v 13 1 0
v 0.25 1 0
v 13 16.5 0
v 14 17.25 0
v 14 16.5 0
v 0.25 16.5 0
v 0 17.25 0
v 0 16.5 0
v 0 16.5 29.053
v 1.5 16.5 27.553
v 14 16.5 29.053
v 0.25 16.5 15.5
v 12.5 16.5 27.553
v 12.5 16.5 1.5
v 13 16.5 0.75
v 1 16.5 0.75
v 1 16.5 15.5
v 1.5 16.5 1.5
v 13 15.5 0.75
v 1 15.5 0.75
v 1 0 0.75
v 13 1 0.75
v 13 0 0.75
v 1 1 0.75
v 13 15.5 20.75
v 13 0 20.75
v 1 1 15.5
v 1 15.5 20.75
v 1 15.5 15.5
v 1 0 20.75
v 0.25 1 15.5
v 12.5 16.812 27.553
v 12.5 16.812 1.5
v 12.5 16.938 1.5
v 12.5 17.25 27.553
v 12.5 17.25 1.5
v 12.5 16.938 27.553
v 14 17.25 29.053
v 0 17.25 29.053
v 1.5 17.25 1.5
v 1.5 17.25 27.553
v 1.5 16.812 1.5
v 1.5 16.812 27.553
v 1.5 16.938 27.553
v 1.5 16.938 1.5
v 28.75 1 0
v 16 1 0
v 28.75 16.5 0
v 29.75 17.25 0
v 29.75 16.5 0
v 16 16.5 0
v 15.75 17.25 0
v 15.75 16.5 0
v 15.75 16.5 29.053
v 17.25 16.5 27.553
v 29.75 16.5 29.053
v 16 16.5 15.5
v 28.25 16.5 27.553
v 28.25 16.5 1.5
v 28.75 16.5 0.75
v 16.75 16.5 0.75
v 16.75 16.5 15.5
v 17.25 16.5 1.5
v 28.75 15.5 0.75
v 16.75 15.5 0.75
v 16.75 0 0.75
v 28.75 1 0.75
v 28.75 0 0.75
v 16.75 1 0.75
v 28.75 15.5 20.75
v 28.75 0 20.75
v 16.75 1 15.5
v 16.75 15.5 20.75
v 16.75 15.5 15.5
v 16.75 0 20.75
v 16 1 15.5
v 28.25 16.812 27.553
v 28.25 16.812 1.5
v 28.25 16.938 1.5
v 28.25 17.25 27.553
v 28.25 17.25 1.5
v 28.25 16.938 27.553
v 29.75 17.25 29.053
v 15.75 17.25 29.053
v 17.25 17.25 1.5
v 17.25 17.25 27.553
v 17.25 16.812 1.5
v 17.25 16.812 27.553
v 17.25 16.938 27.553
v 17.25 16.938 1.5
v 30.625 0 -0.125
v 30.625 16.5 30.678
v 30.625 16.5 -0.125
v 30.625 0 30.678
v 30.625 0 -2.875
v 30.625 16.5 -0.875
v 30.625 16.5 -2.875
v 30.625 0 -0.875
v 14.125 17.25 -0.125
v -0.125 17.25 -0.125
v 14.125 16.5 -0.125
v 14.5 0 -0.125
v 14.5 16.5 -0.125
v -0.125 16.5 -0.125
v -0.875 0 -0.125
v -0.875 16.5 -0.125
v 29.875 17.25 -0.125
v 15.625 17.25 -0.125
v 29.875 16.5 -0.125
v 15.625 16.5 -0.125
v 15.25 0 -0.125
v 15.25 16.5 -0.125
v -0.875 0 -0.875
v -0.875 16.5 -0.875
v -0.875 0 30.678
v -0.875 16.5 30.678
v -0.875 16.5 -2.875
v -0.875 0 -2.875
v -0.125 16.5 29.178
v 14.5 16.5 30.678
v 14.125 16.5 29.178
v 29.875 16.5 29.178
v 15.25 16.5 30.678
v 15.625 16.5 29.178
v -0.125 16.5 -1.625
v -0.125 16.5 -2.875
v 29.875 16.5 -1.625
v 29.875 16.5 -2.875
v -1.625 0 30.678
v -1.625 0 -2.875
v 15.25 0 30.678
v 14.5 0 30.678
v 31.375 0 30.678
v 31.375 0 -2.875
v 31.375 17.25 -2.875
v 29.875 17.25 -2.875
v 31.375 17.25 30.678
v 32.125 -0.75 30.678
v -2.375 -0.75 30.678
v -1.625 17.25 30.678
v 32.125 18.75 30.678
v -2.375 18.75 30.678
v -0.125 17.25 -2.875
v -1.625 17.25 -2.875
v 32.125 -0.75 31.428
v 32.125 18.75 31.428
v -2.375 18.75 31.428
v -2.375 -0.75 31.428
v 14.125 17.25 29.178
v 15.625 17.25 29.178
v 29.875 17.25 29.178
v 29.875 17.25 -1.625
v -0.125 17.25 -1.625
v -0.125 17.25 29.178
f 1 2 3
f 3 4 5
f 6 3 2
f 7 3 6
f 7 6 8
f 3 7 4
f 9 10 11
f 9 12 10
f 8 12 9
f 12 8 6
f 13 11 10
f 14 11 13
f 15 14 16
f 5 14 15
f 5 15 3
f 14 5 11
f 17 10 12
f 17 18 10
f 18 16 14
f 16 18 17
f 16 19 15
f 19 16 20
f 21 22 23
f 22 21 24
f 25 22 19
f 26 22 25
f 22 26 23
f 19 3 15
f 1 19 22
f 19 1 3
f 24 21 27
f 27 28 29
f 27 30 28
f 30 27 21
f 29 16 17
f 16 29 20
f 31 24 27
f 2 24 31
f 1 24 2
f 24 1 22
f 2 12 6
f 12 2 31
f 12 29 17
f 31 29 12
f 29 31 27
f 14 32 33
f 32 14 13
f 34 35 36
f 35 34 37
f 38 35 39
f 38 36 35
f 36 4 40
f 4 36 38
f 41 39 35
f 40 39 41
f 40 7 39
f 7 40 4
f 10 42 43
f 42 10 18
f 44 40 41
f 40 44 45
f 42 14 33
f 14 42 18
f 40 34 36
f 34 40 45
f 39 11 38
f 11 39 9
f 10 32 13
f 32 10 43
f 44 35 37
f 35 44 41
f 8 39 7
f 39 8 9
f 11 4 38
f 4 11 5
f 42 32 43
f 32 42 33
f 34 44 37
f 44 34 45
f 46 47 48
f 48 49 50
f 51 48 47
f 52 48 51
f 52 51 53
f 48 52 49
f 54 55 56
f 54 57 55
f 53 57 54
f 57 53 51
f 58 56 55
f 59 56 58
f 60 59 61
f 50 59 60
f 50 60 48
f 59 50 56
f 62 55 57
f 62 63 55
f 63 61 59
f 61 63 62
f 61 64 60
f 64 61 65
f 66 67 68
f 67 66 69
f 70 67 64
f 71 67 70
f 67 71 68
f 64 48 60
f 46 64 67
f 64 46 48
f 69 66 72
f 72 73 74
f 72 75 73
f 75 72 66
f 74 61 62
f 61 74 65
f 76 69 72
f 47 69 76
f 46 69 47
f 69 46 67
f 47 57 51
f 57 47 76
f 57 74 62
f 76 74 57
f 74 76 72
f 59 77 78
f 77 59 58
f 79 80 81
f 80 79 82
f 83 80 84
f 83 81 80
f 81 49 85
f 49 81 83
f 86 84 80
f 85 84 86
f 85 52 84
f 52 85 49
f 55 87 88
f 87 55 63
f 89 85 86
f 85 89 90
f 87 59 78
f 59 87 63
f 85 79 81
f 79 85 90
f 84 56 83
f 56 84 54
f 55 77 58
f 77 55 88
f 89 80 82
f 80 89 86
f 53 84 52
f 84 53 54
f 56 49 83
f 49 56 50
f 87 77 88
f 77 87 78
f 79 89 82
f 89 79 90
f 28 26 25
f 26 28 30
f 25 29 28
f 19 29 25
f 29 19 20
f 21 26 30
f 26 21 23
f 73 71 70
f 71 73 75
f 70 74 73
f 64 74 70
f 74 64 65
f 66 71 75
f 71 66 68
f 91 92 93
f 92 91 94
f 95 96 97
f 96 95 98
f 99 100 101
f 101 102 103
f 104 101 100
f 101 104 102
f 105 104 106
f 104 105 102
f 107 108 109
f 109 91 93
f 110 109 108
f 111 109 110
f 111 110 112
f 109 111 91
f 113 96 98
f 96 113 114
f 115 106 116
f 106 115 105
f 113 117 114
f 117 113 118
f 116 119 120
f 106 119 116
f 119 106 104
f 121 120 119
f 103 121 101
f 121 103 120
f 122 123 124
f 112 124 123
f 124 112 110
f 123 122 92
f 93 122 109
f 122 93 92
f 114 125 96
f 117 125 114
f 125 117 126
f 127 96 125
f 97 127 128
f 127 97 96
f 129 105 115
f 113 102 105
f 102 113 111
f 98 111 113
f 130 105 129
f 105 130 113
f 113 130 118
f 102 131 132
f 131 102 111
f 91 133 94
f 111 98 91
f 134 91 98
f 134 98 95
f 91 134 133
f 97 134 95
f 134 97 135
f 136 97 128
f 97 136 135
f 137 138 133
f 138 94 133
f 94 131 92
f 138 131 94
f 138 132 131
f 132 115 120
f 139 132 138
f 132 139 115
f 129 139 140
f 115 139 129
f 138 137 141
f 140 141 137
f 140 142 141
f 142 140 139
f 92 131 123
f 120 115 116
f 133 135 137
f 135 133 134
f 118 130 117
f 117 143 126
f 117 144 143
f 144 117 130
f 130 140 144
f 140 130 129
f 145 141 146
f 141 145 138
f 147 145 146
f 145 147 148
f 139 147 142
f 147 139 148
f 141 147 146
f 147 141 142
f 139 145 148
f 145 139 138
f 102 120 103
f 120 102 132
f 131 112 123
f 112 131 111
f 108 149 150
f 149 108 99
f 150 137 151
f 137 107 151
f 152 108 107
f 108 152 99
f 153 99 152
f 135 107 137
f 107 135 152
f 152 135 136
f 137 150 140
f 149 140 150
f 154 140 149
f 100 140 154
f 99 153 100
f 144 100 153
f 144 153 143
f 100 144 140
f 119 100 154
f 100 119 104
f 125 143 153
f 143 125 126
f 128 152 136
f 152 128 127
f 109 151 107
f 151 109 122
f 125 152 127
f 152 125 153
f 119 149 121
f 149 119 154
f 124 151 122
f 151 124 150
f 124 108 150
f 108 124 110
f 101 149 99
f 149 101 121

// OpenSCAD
module board( size, label = false ) {
    // size[0] is always with the grain.
    // size[1] is against the grain.
    // size[2] is the board thickness.
    
    cube( size = size );
    
    // Output the size of the board for easy cut lists.
    echo( str( size[2], " ", label, ": ", size[0], "x", size[1]));
}

width_of_can = 12;
height_of_can = 20;
depth_of_can = 15.5;
number_of_cans = 2;
bead_board_inset = 1/2;
bead_board_thickness = 1/8;
lid_overhang_front = 1.5;  // Overhang for the lid front
lid_overhang_sides = .75; // Overhang for the lid sides
lid_overhang_back = .75; // Overhang for the back of the lid.

toe_clearance = 2; // Space between the bottom board and the floor.
stock_thickness = 3/4;
cabinet_door_clearance = 1/8;

horizontal_can_clearance = 1;
vertical_can_clearance = 3;
depth_can_clearance = 1; // Space behind cans.

each_can_cabinet_door_width = width_of_can + horizontal_can_clearance + horizontal_can_clearance;

each_can_cabinet_door_height =
    stock_thickness // The base of the tilting door.
    + sqrt( ( height_of_can * height_of_can ) + ( depth_of_can * depth_of_can ) ) // The longest diagonal across the can.
    + vertical_can_clearance // Extra space for clearance and garbage at the top.
    ;

face_frame_width = 1.5;
depth_of_box = depth_of_can + depth_can_clearance;

width_of_horizontal_base =
    (number_of_cans * ( each_can_cabinet_door_width + cabinet_door_clearance + cabinet_door_clearance ) ) // Space for doors and clearance.
    + ((number_of_cans + 1 ) * face_frame_width) // Space for the surrounding face frames
    - stock_thickness - stock_thickness // Minus the width of the end boards.
    ;

translate([0, depth_of_box+stock_thickness, 0]) rotate([-40 * $t, 0, 0]) translate([0, -depth_of_box-stock_thickness, 0]) union() {
    color( "white" ) {
    translate([0, depth_of_box + stock_thickness, 0])
    for (can_number=[0:number_of_cans-1]){
        // Cabinet doors.
        translate([
            ( can_number * ( each_can_cabinet_door_width + cabinet_door_clearance + face_frame_width + cabinet_door_clearance ) ),
            0,
            0
         ])
            rotate([90, 0, 0])
            union() {
                    // Base that holds the can.
        translate([width_of_can + ((each_can_cabinet_door_width - width_of_can) / 2), stock_thickness, stock_thickness]) 
            rotate([0, -90, 90])
            board( [ depth_of_can, width_of_can, stock_thickness], "can base" );
           
                // Base sides
                translate([((each_can_cabinet_door_width - width_of_can) / 2), 0, stock_thickness]) rotate([0, -90, 0]) board( [ depth_of_can, depth_of_box - depth_can_clearance, stock_thickness ], "can sides (combined)" );
            
                // Bottom board.
                translate([face_frame_width, 0, 0])
                    board([ each_can_cabinet_door_width - (face_frame_width * 2), face_frame_width, stock_thickness], "door face frame" );
            
                // Top Board.
                translate([face_frame_width, each_can_cabinet_door_height - face_frame_width, 0])
                    board([ each_can_cabinet_door_width - (face_frame_width * 2), face_frame_width, stock_thickness], "door face frame" );
            
                // Left board.
                translate([face_frame_width, 0, 0] )
                    rotate( [0, 0, 90 ] )
                    board( [ each_can_cabinet_door_height, face_frame_width, stock_thickness ], "door face frame" );
            
                // Right board.
                translate([each_can_cabinet_door_width, 0, 0] )
                    rotate( [0, 0, 90 ] )
                    board( [ each_can_cabinet_door_height, face_frame_width, stock_thickness ], "door face frame" );
            
                // Inset.
                color( "white" ) translate([each_can_cabinet_door_width - face_frame_width + bead_board_inset, face_frame_width - bead_board_inset, ( (stock_thickness - bead_board_thickness ) / 2) ])
                    rotate([0, 0, 90])
                    board([ each_can_cabinet_door_height + ( bead_board_inset * 2 ) - face_frame_width - face_frame_width, each_can_cabinet_door_width + ( bead_board_inset * 2 ) - face_frame_width - face_frame_width, bead_board_thickness], "beadboard" );
    }
}}
    // Mock up the cans.
    color( "orange") for (can_number=[0:number_of_cans-1]) {
        translate([
            ((each_can_cabinet_door_width - width_of_can) / 2)
    
        + (can_number * (each_can_cabinet_door_width + cabinet_door_clearance + cabinet_door_clearance + face_frame_width ) )
    
        ,
            0, stock_thickness
        ])
            cube([width_of_can, depth_of_can, height_of_can]);
    }

}{

// Bottom support board.
color( "white" ) translate([
    -cabinet_door_clearance + stock_thickness - face_frame_width,
    0,
    -stock_thickness - cabinet_door_clearance
    ])
    board( [ width_of_horizontal_base, depth_of_box, stock_thickness ], "box frame (bottom)" );

// Near side.
color( "white" ) translate( [ stock_thickness - cabinet_door_clearance - face_frame_width + width_of_horizontal_base + stock_thickness, 0, -toe_clearance - stock_thickness - cabinet_door_clearance ] )
rotate( [ 0, -90, 0 ] )
    board( [
        toe_clearance + stock_thickness + cabinet_door_clearance + each_can_cabinet_door_height + cabinet_door_clearance + face_frame_width,
        depth_of_box,
        stock_thickness
    ], "box frame" );

// Far side
color( "white" ) translate( [ -cabinet_door_clearance + stock_thickness - face_frame_width, 0, -toe_clearance - stock_thickness - cabinet_door_clearance ] )
rotate( [ 0, -90, 0 ] )
    board( [
        toe_clearance + stock_thickness + cabinet_door_clearance + each_can_cabinet_door_height + cabinet_door_clearance + face_frame_width,
        depth_of_box,
        stock_thickness
    ], "box frame" );

// Top
color( "tan" ) translate([
    -(face_frame_width - stock_thickness) - stock_thickness - lid_overhang_sides - cabinet_door_clearance,
    -lid_overhang_back,
    -stock_thickness - cabinet_door_clearance + cabinet_door_clearance + each_can_cabinet_door_height + cabinet_door_clearance + stock_thickness + face_frame_width
    ])
    board( [ width_of_horizontal_base + stock_thickness + stock_thickness + lid_overhang_sides + lid_overhang_sides, depth_of_box + lid_overhang_front + lid_overhang_back + stock_thickness, stock_thickness ], "box frame top" );
    
// Vertical dividers.
color( "white" ) for (can_number = [0:number_of_cans-2]) {
    translate([
        stock_thickness
        + each_can_cabinet_door_width
        - (stock_thickness/2)
        + ((face_frame_width + cabinet_door_clearance + cabinet_door_clearance)/2)
        // Everything above is to place the first one after the first door.
        // The rest is to shift every next divider over the equivalent number of full door widths.
        + ( 
            can_number *
            (
                each_can_cabinet_door_width
                + cabinet_door_clearance
                + cabinet_door_clearance
                + face_frame_width
            )
        )
        ,
        0,
        -cabinet_door_clearance])
    rotate([0, -90, 0])
        board( [ each_can_cabinet_door_height + cabinet_door_clearance + cabinet_door_clearance + face_frame_width, depth_of_box, stock_thickness ], "box frame (interior vertical)" );
}

// Face frame

// Near stile
color( "white" ) translate([-cabinet_door_clearance - face_frame_width, depth_of_box, -cabinet_door_clearance - stock_thickness - toe_clearance]) 
rotate([0, -90, -90])
    board([toe_clearance + stock_thickness + cabinet_door_clearance + each_can_cabinet_door_height + cabinet_door_clearance + face_frame_width, face_frame_width, stock_thickness], "face frame");

// Far stile
color( "white" ) translate([-cabinet_door_clearance - face_frame_width - ( face_frame_width - stock_thickness) + width_of_horizontal_base + stock_thickness, depth_of_box, -cabinet_door_clearance - stock_thickness - toe_clearance]) 
rotate([0, -90, -90])
    board([toe_clearance + stock_thickness + cabinet_door_clearance + each_can_cabinet_door_height + cabinet_door_clearance + face_frame_width, face_frame_width, stock_thickness], "face frame");

// Bottom rail
color( "white" ) translate([-cabinet_door_clearance, depth_of_box, -cabinet_door_clearance - face_frame_width])
    translate([0, stock_thickness, 0]) rotate([90, 0, 0]) board([width_of_horizontal_base - ((face_frame_width - stock_thickness) * 2), face_frame_width, stock_thickness], "face frame");

// Top rail
color( "white" ) translate([-cabinet_door_clearance, depth_of_box, -cabinet_door_clearance - face_frame_width + each_can_cabinet_door_height + cabinet_door_clearance + cabinet_door_clearance + face_frame_width])
    translate([0, stock_thickness, 0]) rotate([90, 0, 0]) board([width_of_horizontal_base - ((face_frame_width - stock_thickness) * 2), face_frame_width, stock_thickness], "face frame");

// Vertical stiles.
color( "white" ) for (can_number = [0:number_of_cans-2]) {
    translate([
        stock_thickness
        + each_can_cabinet_door_width
        - (stock_thickness/2)
        + ((face_frame_width + cabinet_door_clearance + cabinet_door_clearance)/2)
        - stock_thickness
        - ( ( face_frame_width - stock_thickness ) / 2 )
        // Everything above is to place the first one after the first door.
        // The rest is to shift every next divider over the equivalent number of full door widths.
        + ( 
            can_number *
            (
                each_can_cabinet_door_width
                + cabinet_door_clearance
                + cabinet_door_clearance
                + face_frame_width
            )
        )
        ,
        depth_of_box,
        -cabinet_door_clearance])
    rotate([0, -90, -90])
        board( [ each_can_cabinet_door_height + cabinet_door_clearance + cabinet_door_clearance, face_frame_width, stock_thickness ], "face frame (interior vertical)" );
}
}
